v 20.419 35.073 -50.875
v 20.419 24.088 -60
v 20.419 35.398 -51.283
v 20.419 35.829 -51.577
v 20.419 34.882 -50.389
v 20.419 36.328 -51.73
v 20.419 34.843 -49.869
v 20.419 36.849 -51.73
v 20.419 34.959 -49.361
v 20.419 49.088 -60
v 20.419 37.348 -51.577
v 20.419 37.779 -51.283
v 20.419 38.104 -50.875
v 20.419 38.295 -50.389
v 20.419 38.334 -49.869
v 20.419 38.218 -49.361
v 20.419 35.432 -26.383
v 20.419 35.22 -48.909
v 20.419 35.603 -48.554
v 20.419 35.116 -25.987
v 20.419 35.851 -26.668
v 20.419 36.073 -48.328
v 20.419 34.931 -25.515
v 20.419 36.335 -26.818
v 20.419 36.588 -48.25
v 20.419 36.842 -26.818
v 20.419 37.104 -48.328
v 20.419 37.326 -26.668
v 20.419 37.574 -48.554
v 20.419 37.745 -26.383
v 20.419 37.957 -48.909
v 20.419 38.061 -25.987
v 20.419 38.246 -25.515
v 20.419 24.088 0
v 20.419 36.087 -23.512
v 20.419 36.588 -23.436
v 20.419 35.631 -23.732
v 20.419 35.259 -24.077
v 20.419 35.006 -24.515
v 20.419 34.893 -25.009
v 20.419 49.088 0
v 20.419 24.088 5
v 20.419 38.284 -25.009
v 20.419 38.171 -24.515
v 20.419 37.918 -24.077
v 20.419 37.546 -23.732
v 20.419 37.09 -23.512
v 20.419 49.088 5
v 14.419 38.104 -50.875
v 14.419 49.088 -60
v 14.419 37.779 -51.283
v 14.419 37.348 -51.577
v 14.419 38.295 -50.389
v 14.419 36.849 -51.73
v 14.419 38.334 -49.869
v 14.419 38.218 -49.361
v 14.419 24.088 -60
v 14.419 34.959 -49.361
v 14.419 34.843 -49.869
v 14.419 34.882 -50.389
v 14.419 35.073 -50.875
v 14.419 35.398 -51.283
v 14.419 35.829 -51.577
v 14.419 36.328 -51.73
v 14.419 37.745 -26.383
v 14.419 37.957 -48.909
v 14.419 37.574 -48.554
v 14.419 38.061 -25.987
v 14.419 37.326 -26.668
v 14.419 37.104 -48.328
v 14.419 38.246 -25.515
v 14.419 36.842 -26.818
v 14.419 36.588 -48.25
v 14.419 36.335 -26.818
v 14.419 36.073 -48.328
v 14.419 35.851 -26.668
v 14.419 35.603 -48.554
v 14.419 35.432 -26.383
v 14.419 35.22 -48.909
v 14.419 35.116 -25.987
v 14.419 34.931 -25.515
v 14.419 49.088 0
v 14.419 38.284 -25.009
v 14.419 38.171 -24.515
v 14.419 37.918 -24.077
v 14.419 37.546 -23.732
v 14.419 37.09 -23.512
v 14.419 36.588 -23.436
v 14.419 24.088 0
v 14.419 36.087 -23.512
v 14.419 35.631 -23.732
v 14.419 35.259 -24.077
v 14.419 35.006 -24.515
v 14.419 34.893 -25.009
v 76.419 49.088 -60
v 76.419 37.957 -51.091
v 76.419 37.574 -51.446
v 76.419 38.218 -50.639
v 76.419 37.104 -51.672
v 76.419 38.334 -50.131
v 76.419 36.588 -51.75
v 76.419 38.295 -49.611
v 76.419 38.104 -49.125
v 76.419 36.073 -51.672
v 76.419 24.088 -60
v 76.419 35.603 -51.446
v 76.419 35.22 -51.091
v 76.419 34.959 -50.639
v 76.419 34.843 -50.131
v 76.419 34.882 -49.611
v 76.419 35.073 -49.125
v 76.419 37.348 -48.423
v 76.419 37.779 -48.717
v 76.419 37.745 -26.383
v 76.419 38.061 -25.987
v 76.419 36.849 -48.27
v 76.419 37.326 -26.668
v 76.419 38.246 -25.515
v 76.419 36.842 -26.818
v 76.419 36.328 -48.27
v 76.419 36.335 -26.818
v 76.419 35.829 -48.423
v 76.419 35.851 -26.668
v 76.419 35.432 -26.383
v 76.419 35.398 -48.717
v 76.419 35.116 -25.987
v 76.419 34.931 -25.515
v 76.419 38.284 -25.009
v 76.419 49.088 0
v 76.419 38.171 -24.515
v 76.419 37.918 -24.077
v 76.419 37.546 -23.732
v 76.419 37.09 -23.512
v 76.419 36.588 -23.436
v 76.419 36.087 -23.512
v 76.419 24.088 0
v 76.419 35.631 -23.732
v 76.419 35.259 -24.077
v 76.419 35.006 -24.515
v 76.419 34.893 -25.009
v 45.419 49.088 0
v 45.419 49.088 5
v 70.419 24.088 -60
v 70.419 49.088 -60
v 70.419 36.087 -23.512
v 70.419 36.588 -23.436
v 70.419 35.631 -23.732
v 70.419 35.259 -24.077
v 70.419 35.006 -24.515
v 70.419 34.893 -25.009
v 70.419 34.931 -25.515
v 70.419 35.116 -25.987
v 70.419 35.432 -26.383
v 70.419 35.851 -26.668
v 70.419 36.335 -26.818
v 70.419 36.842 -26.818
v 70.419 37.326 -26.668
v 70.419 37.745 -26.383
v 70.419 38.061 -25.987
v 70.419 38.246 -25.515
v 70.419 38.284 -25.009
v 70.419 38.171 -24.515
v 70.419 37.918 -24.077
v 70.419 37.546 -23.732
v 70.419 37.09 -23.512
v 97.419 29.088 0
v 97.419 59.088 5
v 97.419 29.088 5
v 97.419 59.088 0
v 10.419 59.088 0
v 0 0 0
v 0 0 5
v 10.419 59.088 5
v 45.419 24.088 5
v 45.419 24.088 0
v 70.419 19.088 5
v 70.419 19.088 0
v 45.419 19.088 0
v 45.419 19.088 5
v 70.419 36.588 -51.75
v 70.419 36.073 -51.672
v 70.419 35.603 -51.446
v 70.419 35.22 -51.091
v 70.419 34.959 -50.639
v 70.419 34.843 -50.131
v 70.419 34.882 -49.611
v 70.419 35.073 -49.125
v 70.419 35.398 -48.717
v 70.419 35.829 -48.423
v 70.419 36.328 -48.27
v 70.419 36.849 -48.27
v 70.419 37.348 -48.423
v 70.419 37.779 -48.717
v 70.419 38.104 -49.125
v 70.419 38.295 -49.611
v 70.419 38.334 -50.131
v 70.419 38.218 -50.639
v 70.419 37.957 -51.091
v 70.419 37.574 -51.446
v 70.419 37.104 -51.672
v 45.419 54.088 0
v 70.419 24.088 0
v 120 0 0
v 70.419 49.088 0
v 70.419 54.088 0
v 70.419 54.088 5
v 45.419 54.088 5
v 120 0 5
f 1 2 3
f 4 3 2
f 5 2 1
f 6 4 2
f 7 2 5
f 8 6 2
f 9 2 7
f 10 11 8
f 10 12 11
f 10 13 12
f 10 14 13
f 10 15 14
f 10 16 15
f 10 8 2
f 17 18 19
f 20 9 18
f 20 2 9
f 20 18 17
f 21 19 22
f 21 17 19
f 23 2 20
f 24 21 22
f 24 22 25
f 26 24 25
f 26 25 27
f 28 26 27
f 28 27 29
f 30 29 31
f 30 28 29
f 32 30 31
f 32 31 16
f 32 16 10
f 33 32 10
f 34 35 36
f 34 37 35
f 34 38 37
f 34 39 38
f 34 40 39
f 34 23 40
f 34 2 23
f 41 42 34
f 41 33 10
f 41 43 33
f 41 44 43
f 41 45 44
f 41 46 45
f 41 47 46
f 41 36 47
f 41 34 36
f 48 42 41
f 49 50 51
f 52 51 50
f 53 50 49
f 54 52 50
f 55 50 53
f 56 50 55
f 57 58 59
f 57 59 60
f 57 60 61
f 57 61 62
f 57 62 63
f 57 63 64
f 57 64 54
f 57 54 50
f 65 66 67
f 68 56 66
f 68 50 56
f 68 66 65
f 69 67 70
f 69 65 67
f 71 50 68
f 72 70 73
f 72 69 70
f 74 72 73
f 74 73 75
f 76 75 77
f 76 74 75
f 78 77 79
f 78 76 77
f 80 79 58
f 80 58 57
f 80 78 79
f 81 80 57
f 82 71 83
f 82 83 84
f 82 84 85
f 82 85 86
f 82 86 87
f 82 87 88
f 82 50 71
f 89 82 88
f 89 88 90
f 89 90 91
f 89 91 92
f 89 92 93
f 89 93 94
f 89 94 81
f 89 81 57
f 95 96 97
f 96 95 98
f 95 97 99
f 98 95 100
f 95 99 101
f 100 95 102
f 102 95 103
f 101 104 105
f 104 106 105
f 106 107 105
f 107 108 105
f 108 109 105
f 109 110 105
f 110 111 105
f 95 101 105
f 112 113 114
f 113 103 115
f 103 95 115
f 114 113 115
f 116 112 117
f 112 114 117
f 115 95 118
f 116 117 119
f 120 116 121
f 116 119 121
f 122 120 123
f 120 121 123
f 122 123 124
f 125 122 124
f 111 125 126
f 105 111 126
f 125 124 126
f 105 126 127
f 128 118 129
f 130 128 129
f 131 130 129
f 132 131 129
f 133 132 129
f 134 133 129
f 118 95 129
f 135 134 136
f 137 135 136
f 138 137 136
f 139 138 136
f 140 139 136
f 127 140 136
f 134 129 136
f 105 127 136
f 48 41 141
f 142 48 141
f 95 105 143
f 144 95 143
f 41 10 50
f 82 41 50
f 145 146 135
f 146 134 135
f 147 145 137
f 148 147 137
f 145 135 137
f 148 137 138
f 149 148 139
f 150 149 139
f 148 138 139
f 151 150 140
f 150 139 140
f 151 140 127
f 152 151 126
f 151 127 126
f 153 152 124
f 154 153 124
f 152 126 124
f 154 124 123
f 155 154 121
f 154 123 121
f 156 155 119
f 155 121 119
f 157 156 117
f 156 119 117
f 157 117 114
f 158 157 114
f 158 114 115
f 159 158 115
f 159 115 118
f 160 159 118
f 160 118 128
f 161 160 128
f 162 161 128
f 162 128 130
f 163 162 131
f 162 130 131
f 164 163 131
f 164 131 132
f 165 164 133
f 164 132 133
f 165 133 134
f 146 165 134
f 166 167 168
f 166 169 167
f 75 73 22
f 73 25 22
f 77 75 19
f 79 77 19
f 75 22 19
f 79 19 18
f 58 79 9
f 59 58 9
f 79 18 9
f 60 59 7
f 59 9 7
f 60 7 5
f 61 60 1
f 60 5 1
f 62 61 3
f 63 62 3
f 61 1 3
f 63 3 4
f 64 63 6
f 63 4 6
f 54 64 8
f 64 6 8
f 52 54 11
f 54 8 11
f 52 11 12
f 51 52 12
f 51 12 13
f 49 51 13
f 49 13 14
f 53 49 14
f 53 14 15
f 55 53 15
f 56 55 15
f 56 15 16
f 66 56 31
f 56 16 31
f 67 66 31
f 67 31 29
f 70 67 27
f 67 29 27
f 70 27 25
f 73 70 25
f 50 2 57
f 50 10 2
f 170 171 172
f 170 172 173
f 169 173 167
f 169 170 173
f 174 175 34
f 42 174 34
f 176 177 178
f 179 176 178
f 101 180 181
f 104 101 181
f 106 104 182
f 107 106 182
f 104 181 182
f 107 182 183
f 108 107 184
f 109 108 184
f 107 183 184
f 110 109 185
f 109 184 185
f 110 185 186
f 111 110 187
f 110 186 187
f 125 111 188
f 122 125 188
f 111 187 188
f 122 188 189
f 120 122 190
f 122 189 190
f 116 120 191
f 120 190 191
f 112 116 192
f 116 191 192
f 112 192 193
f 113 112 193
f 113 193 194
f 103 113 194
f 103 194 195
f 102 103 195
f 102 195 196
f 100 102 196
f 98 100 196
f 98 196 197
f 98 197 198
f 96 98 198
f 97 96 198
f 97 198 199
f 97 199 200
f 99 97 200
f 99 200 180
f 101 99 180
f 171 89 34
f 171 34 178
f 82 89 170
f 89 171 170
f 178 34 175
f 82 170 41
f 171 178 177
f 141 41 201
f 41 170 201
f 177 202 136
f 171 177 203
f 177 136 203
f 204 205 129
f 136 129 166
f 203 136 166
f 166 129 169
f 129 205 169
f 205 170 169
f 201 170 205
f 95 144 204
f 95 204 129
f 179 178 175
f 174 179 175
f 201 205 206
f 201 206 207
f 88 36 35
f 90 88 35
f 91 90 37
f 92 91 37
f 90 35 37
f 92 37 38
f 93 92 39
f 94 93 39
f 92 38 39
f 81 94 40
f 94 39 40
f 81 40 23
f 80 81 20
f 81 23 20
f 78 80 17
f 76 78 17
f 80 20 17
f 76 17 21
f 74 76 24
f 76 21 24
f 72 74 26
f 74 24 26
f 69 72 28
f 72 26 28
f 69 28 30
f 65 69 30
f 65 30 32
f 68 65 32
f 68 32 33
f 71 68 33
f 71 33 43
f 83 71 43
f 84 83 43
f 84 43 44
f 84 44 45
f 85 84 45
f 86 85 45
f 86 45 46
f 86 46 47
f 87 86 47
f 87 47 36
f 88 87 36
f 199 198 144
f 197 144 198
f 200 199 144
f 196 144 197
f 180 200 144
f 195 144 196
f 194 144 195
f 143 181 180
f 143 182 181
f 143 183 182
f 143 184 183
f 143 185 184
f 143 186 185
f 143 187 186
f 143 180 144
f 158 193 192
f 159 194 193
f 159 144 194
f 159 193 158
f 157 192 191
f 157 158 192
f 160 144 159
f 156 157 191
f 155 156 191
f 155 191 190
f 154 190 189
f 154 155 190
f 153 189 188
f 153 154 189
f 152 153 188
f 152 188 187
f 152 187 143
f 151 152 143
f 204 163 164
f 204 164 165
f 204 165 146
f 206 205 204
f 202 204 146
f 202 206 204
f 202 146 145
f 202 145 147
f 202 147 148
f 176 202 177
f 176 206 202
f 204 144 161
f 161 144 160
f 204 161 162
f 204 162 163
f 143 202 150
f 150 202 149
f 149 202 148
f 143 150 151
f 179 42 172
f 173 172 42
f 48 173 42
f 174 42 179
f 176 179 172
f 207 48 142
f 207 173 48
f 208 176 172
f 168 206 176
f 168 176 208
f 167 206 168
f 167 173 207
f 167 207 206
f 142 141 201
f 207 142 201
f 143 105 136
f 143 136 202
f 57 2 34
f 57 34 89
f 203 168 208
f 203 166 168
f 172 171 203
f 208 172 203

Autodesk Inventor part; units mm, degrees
ref_plane "YZ Plane" through (0, 0, 0) normal (1, 0, 0) x (0, 1, 0)
ref_plane "XZ Plane" through (0, 0, 0) normal (0, 1, 0) x (-1, 0, 0)
ref_plane "XY Plane" through (0, 0, 0) normal (0, 0, 1) x (1, 0, 0)
sketch "Szkic1" plane through (0, 0, 0) normal (0, 0, 1) x (1, 0, 0)
  line L0 (0, 0) -> (120, 0)
  line L1 (0, 0) -> (10.4189, 59.0885)
  line L2 (0, 0) -> (60, 0) construction
  line L3 (10.4189, 59.0885) -> (70.4189, 59.0885)
  line L4 (70.4189, 59.0885) -> (97.4189, 59.0885)
  line L5 (97.4189, 59.0885) -> (97.4189, 29.0885)
  line L6 (97.4189, 29.0885) -> (120, 0)
  line L7 (20.4189, 49.0885) -> (70.4189, 49.0885)
  line L8 (70.4189, 49.0885) -> (70.4189, 24.0885)
  line L9 (70.4189, 24.0885) -> (20.4189, 24.0885)
  line L10 (20.4189, 24.0885) -> (20.4189, 49.0885)
  dimension "d0" = 120
  dimension "d1" = 60
  dimension "d2" = 80
  dimension "d3" = 60
  dimension "d4" = 27
  dimension "d5" = 30
  dimension "d6" = 50
  dimension "d7" = 25
  dimension "d8" = 10
  dimension "d9" = 10
extrude "Wyciągnięcie proste1" add sketch "Szkic1" along normal blind 5
sketch "Szkic2" plane through (0, 0, 0) normal (0, 0, -1) x (-1, 0, 0)
  line L0 (-20.4189, 24.0885) -> (-20.4189, 49.0885) projected
  line L1 (-20.4189, 49.0885) -> (-14.4189, 49.0885)
  line L2 (-14.4189, 49.0885) -> (-14.4189, 24.0885)
  line L3 (-14.4189, 24.0885) -> (-20.4189, 24.0885)
  line L4 (-20.4189, 24.0885) -> (-20.4189, 49.0885)
  point P0 (0, 0)
  dimension "d12" = 6
extrude "Wyciągnięcie proste2" add sketch "Szkic2" along normal blind 30
sketch "Szkic3" plane through (0, 0, -30) normal (0, 0, -1) x (-1, 0, 0)
  line L0 (-20.4189, 24.0885) -> (-20.4189, 49.0885) projected
  line L1 (-20.4189, 24.0885) -> (-14.4189, 24.0885) projected
  line L2 (-20.4189, 49.0885) -> (-14.4189, 49.0885)
  line L3 (-14.4189, 49.0885) -> (-14.4189, 24.0885)
  line L4 (-14.4189, 24.0885) -> (-20.4189, 24.0885)
  line L5 (-20.4189, 24.0885) -> (-20.4189, 49.0885)
  point P0 (0, 0)
extrude "Wyciągnięcie proste3" add sketch "Szkic3" along normal blind 30
sketch "Szkic4" plane through (0, 0, 0) normal (0, 0, -1) x (-1, 0, 0)
  line L0 (-70.4189, 49.0885) -> (-70.4189, 24.0885) projected
  line L1 (-70.4189, 49.0885) -> (-76.4189, 49.0885)
  line L2 (-76.4189, 49.0885) -> (-76.4189, 24.0885)
  line L3 (-76.4189, 24.0885) -> (-70.4189, 24.0885)
  line L4 (-70.4189, 24.0885) -> (-70.4189, 49.0885)
  point P0 (0, 0)
  dimension "d17" = 6
extrude "Wyciągnięcie proste4" add sketch "Szkic4" along normal up to surface (60 mm away)
sketch "Szkic5" plane through (14.4189, 24.0885, 0) normal (-1, 0, 0) x (0, 0, 1)
  line L0 (-60, 0) -> (-60, 25) projected
  point P0 (0, -24.0885)
  point P1 (-50, 12.5)
  point P2 (-60, 12.5)
  dimension "d20" = 10
hole "Otwór1" at (14.4189, 36.5885, -50) direction (1, 0, 0) diameter 3.5 depth 6
sketch "Szkic7" plane through (76.4189, 24.0885, 0) normal (1, 0, 0) x (0, 0, -1)
  circle A0 centre (50, 12.5) radius 1.75 projected
  point P0 (0, -24.0885)
hole "Otwór2" at (76.4189, 36.5885, -50) direction (-1, 0, 0) diameter 3.5 depth 6
sketch "Szkic8" plane through (14.4189, 24.0885, 0) normal (-1, 0, 0) x (0, 0, 1)
  point P0 (0, -24.0885)
  point P1 (-25.1365, 12.5)
hole "Otwór3" at (14.4189, 36.5885, -25.1365) direction (1, 0, 0) diameter 3.4 end through all clearance for "Śruba ze łbem stożkowym ISO 2009/7046" size "M3" standard "ISO"
sketch "Szkic10" plane through (0, 0, 0) normal (0, 0, -1) x (-1, 0, 0)
  line L0 (-70.4189, 49.0885) -> (-70.4189, 24.0885) projected
  line L1 (-70.4189, 49.0885) -> (-70.4189, 54.0885)
  line L2 (-70.4189, 54.0885) -> (-45.4189, 54.0885)
  line L3 (-70.4189, 24.0885) -> (-70.4189, 19.0885)
  line L4 (-70.4189, 19.0885) -> (-45.4189, 19.0885)
  line L5 (-45.4189, 19.0885) -> (-45.4189, 54.0885)
  point P0 (0, 0)
  dimension "d49" = 5
  dimension "d50" = 5
extrude "Wyciągnięcie proste7" cut sketch "Szkic10" against normal blind 10
properties part number "podstawa"
